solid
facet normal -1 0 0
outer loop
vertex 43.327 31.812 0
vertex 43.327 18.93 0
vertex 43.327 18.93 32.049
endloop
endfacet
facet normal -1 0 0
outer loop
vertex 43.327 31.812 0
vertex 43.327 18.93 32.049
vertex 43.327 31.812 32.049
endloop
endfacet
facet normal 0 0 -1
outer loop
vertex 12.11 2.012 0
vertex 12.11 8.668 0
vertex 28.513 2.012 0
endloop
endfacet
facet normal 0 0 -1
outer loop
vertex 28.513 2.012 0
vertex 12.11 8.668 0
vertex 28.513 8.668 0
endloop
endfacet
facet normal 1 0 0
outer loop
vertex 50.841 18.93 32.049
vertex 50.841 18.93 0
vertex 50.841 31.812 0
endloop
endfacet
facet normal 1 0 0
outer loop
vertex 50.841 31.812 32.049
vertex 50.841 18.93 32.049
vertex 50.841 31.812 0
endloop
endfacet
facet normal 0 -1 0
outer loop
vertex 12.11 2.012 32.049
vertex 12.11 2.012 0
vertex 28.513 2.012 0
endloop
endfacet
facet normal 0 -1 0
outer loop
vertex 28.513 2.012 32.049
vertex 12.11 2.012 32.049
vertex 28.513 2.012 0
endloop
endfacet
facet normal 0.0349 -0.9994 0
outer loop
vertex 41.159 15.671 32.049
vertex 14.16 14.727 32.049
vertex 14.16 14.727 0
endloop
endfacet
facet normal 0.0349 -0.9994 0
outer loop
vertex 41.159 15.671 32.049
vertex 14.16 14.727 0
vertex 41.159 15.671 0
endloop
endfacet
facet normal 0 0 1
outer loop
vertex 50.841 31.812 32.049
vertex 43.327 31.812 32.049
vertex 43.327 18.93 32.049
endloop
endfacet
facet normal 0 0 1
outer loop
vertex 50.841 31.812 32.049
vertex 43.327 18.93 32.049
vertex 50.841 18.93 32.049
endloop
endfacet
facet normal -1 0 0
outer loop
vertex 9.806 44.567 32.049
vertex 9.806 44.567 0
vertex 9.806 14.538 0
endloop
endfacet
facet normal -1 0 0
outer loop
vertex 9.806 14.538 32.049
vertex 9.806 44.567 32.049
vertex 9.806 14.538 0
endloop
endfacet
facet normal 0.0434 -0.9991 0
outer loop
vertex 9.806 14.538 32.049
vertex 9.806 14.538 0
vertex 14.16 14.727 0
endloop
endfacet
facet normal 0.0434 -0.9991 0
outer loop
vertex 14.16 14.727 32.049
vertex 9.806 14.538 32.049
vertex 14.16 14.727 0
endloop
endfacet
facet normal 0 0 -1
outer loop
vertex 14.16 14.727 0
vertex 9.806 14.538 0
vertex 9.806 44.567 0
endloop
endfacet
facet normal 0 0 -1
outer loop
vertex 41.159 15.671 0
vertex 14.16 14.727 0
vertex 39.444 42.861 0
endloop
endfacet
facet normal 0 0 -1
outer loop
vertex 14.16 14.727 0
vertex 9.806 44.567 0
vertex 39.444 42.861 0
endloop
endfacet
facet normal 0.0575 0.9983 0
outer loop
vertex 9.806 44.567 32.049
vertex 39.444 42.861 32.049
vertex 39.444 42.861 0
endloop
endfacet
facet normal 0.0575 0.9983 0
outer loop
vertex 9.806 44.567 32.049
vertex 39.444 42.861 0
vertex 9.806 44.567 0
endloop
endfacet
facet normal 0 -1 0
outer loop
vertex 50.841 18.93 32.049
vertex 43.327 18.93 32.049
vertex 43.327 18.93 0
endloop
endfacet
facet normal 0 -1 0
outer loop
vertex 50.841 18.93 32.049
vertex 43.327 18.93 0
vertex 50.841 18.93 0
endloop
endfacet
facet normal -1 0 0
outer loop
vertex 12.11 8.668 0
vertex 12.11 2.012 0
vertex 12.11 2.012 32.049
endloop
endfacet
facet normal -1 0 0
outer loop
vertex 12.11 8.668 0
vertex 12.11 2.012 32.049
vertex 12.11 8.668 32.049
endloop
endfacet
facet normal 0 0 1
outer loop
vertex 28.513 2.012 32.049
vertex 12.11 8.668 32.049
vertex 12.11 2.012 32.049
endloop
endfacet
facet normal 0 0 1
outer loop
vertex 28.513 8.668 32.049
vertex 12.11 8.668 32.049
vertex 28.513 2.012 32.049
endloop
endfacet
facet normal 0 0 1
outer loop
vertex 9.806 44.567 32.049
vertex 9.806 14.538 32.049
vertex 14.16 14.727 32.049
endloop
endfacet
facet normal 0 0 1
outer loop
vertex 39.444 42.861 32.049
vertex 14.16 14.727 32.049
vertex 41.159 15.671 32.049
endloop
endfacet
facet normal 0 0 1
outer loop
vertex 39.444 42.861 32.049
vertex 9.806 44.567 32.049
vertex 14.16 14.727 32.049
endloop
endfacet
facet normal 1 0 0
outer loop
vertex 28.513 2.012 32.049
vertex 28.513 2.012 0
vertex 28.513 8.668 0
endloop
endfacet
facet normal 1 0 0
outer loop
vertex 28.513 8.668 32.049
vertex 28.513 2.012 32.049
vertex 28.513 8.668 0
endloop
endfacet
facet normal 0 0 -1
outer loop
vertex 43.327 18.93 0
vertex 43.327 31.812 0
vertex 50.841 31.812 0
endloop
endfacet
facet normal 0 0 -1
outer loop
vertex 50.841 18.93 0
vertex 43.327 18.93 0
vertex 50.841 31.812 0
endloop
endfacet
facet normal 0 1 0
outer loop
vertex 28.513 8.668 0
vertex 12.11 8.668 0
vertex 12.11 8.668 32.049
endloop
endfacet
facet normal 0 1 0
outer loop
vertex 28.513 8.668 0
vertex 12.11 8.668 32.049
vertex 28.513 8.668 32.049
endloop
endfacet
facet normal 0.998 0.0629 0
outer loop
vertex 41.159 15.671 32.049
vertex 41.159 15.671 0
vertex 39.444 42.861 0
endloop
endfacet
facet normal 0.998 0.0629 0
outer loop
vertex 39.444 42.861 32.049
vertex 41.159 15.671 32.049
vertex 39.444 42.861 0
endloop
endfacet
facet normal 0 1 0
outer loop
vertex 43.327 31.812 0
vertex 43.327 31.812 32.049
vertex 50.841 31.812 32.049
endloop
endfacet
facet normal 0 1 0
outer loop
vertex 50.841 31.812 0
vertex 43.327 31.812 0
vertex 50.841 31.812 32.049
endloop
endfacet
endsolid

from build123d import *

# Parameters (mm, degrees)
F0_W     = 7.514417
F0_H     = 12.881864
F0_W_2   = 16.4029
F0_H_2   = 6.65563
F1_DEPTH = 32.048814


with BuildPart() as f1:
    # F0 (on Top) → F1 (new body)
    with BuildSketch(Plane.XY):
        Polygon((9.80648, 44.567125), (9.80648, 14.537834), (14.160216, 14.726631), (41.159034, 15.67065), (39.444314, 42.861348), align=None)
        with Locations((47.084201, 25.371043)):
            Rectangle(F0_W, F0_H)
        with Locations((20.311404, 5.339751)):
            Rectangle(F0_W_2, F0_H_2)
    extrude(amount=F1_DEPTH)


solid = f1.part
